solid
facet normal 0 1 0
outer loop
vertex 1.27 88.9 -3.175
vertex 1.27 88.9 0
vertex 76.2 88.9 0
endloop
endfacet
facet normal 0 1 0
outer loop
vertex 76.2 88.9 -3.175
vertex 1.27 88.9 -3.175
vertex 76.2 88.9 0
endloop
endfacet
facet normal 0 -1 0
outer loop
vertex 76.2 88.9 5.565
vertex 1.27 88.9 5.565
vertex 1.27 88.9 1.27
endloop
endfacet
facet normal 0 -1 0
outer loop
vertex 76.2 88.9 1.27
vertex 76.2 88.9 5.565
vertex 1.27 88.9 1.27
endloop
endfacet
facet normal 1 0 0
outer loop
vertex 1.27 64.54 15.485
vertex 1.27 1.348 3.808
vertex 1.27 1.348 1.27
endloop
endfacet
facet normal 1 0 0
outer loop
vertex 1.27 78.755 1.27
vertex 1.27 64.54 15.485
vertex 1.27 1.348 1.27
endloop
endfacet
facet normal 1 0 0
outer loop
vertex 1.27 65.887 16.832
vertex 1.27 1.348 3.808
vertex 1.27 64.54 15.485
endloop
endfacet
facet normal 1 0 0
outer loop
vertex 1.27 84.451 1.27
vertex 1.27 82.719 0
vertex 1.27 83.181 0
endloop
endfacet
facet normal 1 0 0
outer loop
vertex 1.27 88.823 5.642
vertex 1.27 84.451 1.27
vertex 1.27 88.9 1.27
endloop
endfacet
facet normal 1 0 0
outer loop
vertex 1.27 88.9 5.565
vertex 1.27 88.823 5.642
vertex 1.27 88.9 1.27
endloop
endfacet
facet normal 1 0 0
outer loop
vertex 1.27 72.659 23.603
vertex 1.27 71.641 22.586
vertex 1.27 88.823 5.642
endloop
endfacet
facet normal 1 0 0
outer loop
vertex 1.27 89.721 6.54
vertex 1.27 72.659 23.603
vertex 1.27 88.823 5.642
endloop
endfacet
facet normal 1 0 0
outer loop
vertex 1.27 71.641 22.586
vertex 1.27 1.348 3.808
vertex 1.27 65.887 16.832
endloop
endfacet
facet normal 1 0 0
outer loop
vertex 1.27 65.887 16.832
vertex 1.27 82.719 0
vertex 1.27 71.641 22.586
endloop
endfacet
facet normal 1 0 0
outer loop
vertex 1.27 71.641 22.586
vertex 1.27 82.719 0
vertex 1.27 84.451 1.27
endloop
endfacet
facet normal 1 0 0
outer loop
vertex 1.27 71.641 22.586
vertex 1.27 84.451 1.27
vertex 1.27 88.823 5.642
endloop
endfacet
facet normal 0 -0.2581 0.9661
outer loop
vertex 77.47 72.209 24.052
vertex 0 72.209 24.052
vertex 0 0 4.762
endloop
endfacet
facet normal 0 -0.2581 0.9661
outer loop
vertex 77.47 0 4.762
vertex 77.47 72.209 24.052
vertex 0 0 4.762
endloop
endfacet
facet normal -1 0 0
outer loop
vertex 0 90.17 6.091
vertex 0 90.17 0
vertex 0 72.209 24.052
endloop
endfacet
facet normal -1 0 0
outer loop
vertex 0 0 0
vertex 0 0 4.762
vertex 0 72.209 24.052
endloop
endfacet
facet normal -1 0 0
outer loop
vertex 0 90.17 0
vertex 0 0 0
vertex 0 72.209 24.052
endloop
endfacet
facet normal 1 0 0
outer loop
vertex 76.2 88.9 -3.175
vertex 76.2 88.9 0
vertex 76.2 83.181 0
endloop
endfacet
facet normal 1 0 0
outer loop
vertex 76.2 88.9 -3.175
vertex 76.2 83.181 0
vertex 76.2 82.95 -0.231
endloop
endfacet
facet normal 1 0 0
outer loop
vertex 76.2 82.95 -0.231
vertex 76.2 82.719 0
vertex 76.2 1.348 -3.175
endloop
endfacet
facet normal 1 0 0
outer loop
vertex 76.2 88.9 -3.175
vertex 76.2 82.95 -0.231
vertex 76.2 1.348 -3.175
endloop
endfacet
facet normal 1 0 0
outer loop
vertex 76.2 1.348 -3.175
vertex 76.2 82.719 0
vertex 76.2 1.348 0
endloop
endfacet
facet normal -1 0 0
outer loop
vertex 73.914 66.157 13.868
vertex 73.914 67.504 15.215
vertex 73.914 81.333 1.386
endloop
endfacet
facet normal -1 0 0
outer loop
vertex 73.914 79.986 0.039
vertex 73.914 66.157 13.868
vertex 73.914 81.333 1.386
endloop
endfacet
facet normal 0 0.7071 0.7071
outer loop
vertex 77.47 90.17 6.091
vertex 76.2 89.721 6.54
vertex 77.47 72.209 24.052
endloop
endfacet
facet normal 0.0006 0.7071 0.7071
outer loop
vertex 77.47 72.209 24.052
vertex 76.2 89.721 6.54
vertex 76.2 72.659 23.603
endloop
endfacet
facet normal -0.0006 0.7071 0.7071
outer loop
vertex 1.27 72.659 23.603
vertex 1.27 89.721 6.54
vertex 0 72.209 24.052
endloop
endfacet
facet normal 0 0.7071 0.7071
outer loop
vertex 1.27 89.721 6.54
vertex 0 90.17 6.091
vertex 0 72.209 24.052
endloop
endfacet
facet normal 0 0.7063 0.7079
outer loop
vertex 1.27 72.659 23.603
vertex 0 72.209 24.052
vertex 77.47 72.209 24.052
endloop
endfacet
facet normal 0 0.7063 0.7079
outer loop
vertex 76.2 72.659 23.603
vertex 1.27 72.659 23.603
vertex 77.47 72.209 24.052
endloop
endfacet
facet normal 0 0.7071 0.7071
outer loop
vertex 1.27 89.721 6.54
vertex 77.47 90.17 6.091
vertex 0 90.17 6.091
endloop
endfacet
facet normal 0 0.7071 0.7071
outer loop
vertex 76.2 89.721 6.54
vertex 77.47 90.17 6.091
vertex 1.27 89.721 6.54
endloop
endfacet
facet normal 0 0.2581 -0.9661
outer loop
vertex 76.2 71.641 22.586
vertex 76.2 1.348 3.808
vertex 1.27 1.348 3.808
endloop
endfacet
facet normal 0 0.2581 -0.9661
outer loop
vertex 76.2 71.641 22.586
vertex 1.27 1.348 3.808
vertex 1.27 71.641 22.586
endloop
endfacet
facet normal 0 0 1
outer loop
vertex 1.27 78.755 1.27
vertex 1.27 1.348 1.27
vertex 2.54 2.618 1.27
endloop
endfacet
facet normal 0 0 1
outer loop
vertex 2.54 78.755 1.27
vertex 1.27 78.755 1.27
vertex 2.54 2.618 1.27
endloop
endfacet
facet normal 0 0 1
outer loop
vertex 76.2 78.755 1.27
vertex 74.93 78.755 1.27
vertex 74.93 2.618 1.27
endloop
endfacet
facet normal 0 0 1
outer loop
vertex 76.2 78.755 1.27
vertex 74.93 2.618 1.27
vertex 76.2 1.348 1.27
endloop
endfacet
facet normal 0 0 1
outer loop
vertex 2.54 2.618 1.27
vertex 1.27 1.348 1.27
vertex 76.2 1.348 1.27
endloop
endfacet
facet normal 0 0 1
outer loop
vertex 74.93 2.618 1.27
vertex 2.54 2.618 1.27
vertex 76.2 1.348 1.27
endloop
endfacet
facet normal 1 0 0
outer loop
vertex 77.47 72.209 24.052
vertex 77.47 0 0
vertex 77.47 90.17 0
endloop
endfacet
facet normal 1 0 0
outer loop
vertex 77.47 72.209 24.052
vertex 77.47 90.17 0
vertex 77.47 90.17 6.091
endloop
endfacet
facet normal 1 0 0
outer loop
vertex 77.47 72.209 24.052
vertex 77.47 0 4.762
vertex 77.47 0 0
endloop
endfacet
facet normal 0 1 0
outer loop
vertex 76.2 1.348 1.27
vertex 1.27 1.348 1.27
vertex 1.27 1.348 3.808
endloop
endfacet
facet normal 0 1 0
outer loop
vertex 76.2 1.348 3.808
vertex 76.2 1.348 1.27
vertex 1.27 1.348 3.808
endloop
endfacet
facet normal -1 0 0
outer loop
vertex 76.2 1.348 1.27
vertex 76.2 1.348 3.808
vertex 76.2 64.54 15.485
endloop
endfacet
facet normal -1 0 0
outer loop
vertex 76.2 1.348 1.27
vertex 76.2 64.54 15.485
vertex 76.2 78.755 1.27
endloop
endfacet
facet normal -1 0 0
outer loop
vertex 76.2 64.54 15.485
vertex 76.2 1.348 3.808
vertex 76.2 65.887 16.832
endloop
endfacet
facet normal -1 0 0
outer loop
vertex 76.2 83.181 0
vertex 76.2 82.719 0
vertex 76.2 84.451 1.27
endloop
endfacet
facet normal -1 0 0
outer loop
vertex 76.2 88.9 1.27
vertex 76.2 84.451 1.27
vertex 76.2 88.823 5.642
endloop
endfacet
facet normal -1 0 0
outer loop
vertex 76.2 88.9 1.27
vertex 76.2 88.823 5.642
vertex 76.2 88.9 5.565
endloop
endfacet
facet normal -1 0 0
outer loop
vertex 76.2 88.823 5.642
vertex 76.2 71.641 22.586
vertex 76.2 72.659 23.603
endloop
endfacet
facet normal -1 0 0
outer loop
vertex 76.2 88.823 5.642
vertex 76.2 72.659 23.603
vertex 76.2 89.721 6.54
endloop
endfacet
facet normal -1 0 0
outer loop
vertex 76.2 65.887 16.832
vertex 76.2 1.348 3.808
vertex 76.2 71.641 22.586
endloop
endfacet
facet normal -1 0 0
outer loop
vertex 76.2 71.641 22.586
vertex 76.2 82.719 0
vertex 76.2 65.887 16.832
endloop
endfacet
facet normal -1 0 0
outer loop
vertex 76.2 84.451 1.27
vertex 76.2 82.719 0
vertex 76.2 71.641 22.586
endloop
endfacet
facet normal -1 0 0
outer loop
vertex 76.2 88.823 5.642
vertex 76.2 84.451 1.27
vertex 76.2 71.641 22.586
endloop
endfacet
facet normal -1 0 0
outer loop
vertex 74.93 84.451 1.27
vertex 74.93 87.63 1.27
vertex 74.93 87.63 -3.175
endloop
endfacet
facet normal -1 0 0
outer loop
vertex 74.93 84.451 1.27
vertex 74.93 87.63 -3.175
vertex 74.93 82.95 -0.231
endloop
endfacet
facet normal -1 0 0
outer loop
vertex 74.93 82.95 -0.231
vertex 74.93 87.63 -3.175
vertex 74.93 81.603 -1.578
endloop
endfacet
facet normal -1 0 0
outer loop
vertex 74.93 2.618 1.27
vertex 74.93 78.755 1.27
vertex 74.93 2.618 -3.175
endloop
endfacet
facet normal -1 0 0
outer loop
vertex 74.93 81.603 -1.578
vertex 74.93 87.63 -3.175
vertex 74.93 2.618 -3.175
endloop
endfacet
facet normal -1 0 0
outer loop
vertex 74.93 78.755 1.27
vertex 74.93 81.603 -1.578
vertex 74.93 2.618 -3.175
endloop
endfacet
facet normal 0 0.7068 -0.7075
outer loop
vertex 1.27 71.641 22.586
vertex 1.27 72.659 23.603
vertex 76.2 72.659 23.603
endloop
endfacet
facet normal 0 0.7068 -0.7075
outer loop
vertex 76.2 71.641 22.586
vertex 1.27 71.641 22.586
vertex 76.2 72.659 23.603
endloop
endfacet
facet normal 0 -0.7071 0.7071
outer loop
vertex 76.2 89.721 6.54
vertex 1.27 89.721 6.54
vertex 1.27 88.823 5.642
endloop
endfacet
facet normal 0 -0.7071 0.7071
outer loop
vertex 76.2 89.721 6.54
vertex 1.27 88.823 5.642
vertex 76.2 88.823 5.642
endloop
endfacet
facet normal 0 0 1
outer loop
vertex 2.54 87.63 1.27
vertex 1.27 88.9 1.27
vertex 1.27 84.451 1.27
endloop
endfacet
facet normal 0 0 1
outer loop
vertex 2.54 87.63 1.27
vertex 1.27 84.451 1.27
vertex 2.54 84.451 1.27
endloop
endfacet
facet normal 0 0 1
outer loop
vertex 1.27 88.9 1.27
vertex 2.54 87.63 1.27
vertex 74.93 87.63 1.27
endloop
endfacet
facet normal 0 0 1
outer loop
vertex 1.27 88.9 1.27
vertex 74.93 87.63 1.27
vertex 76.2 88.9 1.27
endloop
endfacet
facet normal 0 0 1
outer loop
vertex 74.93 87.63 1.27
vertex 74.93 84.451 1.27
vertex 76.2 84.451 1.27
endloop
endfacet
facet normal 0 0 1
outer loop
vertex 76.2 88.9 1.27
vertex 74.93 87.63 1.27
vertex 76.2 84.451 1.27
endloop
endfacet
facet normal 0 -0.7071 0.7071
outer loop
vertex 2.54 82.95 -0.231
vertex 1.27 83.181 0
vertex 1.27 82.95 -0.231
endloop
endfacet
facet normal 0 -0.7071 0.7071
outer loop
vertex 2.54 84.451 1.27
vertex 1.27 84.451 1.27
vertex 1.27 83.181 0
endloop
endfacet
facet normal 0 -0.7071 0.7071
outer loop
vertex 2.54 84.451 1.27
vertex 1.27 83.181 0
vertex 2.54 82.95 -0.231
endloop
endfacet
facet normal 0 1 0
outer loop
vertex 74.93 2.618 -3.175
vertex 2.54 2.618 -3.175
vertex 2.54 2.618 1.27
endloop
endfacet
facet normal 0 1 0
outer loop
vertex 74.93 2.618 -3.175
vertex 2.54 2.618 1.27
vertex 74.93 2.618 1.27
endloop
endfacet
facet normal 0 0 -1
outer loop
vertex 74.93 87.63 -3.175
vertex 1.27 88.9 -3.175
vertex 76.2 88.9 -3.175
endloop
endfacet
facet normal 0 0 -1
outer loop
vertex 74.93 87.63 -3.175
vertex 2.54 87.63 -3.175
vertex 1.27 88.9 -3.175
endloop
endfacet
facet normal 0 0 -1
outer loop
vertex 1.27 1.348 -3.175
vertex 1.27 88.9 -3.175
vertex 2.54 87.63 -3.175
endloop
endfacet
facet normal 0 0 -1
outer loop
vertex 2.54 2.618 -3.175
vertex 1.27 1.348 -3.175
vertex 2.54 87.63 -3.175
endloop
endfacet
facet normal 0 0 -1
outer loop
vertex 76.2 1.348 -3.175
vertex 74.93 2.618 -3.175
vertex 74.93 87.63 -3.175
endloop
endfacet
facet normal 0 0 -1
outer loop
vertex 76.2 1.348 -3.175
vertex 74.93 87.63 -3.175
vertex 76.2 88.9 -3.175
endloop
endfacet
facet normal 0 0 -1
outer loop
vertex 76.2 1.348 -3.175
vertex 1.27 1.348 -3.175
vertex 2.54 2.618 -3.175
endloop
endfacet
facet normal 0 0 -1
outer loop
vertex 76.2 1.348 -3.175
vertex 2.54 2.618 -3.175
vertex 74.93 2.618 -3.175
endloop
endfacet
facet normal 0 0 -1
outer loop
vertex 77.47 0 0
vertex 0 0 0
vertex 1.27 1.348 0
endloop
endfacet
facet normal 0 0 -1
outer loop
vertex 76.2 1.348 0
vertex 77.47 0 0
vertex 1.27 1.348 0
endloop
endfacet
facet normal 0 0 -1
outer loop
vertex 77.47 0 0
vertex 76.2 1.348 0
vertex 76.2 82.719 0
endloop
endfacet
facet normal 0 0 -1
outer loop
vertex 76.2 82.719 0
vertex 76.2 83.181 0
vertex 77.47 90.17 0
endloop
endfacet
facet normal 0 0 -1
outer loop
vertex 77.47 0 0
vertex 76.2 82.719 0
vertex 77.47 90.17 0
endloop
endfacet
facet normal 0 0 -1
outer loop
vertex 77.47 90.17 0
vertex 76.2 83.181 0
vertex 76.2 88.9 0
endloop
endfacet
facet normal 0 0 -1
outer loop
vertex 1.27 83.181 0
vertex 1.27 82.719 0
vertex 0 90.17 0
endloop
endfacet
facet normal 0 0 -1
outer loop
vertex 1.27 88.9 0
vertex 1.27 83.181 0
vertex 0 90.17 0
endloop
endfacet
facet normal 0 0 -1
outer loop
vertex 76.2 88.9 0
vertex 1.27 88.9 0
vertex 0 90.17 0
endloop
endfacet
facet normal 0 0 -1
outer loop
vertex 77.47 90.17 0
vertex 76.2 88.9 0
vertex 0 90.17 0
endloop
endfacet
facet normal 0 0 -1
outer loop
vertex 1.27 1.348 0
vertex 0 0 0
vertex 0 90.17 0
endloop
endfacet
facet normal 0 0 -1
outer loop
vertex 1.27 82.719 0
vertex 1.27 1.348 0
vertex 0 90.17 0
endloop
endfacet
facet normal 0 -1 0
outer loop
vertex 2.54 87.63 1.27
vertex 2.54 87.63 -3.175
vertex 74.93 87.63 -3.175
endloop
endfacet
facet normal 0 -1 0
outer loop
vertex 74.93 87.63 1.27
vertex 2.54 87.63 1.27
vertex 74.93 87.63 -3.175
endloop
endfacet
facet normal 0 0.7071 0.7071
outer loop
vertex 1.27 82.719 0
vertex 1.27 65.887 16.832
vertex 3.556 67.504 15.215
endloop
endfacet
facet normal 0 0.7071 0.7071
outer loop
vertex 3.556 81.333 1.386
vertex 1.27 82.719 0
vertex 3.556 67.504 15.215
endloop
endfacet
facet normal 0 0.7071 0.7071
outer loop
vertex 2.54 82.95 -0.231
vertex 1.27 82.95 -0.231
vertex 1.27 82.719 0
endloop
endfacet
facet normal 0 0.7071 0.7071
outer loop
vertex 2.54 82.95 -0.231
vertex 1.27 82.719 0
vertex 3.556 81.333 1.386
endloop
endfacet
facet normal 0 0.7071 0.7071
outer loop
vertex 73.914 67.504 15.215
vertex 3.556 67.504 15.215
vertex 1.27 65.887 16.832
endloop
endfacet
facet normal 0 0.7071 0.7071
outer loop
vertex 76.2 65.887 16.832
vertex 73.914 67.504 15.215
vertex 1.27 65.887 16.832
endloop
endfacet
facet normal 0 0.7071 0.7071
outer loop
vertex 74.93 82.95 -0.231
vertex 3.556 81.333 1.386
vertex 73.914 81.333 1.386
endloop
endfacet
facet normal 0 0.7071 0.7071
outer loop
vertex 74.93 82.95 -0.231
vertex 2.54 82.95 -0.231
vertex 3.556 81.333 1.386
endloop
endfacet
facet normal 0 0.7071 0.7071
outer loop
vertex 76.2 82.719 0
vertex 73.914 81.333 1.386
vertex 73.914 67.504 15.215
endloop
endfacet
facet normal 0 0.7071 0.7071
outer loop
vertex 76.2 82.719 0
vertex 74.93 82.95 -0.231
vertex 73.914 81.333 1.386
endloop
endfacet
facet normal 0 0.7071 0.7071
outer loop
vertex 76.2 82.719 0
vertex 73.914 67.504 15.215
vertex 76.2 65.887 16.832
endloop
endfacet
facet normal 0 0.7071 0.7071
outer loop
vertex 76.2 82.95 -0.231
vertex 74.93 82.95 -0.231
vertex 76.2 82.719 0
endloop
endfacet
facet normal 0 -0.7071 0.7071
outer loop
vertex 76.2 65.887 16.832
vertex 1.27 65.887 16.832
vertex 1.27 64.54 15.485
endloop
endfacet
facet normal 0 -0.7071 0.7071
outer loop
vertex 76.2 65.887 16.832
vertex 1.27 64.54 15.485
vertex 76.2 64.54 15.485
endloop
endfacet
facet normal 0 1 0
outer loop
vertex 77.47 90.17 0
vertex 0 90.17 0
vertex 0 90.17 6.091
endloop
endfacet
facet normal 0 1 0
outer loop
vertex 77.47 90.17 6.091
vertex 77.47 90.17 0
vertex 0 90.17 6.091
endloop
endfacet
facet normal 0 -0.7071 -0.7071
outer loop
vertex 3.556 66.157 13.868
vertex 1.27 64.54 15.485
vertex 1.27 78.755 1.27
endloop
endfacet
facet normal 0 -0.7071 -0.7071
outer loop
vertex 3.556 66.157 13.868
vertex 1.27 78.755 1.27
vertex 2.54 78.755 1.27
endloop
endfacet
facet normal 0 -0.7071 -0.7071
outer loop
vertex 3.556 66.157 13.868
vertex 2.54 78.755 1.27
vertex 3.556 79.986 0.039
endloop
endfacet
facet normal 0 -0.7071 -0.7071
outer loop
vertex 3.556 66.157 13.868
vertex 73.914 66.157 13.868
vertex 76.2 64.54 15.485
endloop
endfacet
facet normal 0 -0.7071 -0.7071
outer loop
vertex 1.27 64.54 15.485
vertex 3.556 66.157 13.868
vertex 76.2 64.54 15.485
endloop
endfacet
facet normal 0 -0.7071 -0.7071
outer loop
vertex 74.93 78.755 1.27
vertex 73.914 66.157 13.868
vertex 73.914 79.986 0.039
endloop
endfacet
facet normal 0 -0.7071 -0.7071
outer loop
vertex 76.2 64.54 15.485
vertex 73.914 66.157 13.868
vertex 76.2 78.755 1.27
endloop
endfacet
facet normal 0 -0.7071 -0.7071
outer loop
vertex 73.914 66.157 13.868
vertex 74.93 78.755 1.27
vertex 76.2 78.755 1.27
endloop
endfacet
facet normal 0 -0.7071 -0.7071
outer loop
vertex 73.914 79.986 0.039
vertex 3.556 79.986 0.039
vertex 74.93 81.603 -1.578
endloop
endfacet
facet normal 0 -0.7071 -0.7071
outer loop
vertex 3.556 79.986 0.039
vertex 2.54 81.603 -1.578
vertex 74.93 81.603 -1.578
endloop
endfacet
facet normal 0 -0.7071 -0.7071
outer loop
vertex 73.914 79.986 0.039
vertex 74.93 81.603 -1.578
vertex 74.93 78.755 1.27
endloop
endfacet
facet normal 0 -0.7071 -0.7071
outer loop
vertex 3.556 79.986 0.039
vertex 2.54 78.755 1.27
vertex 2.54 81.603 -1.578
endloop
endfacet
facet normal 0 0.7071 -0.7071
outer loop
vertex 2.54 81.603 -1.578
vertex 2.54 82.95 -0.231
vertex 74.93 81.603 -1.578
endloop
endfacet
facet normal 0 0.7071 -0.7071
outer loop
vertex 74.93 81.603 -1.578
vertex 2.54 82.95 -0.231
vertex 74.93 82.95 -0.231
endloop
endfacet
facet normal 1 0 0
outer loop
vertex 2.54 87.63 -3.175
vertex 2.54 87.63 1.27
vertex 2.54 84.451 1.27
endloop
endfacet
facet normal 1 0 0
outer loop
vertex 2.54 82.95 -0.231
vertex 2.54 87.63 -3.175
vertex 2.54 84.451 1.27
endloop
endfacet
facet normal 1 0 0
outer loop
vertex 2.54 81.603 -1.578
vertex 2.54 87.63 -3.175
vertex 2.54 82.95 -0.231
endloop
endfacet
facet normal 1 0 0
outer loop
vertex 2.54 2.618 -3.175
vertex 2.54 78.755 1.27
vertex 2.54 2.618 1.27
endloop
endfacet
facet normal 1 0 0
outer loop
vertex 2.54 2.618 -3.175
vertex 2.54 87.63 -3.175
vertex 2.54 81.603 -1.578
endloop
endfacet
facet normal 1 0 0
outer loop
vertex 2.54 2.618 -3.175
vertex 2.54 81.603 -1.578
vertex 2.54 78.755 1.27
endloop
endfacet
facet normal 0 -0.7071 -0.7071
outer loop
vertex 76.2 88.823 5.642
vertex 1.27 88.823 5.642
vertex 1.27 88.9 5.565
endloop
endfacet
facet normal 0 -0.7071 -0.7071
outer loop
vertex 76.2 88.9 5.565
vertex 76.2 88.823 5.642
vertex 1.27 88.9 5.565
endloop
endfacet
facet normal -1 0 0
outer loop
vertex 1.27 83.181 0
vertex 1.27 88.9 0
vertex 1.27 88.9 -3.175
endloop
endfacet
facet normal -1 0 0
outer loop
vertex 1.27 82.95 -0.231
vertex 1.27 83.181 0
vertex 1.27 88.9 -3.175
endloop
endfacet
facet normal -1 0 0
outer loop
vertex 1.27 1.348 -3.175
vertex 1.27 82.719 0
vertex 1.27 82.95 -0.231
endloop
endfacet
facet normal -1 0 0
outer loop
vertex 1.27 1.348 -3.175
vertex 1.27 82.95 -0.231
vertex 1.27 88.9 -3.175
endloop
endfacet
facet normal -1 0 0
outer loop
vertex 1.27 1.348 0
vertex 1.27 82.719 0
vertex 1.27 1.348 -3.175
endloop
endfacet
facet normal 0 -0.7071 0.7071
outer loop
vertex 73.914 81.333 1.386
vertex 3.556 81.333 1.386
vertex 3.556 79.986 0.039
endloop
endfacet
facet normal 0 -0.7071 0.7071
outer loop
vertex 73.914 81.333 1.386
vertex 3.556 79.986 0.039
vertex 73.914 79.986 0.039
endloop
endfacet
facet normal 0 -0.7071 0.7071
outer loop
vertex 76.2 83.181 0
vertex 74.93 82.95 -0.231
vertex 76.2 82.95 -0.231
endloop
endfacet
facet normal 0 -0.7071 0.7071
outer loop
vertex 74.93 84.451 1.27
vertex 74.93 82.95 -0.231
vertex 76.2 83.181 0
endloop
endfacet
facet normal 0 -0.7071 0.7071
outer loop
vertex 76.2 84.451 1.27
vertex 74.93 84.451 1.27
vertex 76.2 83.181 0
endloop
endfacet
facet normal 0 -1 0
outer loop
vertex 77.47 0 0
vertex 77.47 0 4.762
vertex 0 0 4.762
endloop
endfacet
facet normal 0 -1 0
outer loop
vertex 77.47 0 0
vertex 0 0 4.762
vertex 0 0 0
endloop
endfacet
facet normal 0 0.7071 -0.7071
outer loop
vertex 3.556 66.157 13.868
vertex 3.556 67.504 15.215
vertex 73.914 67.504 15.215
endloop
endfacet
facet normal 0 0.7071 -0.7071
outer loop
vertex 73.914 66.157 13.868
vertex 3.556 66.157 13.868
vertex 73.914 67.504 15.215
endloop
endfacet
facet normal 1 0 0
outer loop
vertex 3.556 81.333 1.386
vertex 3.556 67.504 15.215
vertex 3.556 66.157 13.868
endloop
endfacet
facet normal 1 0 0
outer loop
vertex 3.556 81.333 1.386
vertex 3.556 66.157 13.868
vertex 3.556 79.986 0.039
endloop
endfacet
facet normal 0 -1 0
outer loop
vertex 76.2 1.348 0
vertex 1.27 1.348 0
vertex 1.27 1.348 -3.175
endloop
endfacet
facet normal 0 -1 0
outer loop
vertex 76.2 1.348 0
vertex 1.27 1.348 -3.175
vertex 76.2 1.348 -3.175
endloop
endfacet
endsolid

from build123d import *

# Parameters (mm, degrees)
F1_DEPTH      = 77.47
F3_DEPTH      = 1.27
F5_W          = 74.93
F5_H          = 87.551641
F5_W_2        = 72.39
F5_H_2        = 85.011641
F6_DEPTH      = 3.175
F6_DEPTH_BACK = 1.27
F7_W          = 74.93
F7_H          = 24.13
F8_DEPTH      = 9.5758
F10_W         = 74.93
F10_H         = 24.13
F10_W_2       = 70.358
F10_H_2       = 19.558
F11_DEPTH     = 1.905


# Not quite as in the source:
# - a pattern or mirror of a feature is missing from the dataset's text; its kind, count and spacing are read off the source's solid


with BuildPart() as f1:
    # F0 (on Right) → F1 (new body)
    with BuildSketch(Plane.YZ):
        Polygon((88.9000101356, 0), (90.1700101356, 0), (90.1700101356, 6.0914319939), (72.2094978935, 24.0519442361), (0, 4.7625), (0, 0), (1.3483691356, 0), (1.3483691356, 3.8081596938), (71.8294909699, 22.6358999354), (88.9000101356, 5.5653807697), align=None)
    extrude(amount=F1_DEPTH)

    # F2 (on face) → F3 (join)
    with BuildSketch(Plane.YZ.offset(77.47)):
        Polygon((0, 0), (90.1700101356, 0), (90.1700101356, 6.0914319939), (72.2094978935, 24.0519442361), (0, 4.7625), align=None)
    f3 = extrude(amount=-F3_DEPTH)

    # F3_copies: F3 across plane
    add(f3.mirror(Plane(origin=(38.735, 0, 0), x_dir=(0, 0, -1), z_dir=(-1, 0, 0))))

    # F5 (on face) → F6 (join, two sides)
    with BuildSketch(Plane(origin=(0, 0, 0), x_dir=(1, 0, 0), z_dir=(0, 0, -1))) as f6_sk:
        with Locations((38.735, -45.1241896356)):
            Rectangle(F5_W, F5_H)
        with Locations((38.735, -45.1241896356)):
            Rectangle(F5_W_2, F5_H_2, mode=Mode.SUBTRACT)
    extrude(amount=F6_DEPTH)
    extrude(f6_sk.sketch, amount=-F6_DEPTH_BACK)

    # F7 (on face) → F8 (cut)
    with BuildSketch(Plane(origin=(0, 48.1307210648, 48.1307210648), x_dir=(1, 0, 0), z_dir=(0, 0.7071067812, 0.7071067812))):
        with Locations((38.735, 46.7525327565)):
            Rectangle(F7_W, F7_H)
    extrude(amount=-F8_DEPTH, mode=Mode.SUBTRACT)

    # F10 (on offset) → F11 (join)
    with BuildSketch(Plane(origin=(0, 41.3596079495, 41.3596079495), x_dir=(1, 0, 0), z_dir=(0, 0.7071067812, 0.7071067812))):
        with Locations((38.735, 46.7525327565)):
            Rectangle(F10_W, F10_H)
        with Locations((38.735, 46.7525327565)):
            Rectangle(F10_W_2, F10_H_2, mode=Mode.SUBTRACT)
    extrude(amount=-F11_DEPTH)


solid = f1.part
